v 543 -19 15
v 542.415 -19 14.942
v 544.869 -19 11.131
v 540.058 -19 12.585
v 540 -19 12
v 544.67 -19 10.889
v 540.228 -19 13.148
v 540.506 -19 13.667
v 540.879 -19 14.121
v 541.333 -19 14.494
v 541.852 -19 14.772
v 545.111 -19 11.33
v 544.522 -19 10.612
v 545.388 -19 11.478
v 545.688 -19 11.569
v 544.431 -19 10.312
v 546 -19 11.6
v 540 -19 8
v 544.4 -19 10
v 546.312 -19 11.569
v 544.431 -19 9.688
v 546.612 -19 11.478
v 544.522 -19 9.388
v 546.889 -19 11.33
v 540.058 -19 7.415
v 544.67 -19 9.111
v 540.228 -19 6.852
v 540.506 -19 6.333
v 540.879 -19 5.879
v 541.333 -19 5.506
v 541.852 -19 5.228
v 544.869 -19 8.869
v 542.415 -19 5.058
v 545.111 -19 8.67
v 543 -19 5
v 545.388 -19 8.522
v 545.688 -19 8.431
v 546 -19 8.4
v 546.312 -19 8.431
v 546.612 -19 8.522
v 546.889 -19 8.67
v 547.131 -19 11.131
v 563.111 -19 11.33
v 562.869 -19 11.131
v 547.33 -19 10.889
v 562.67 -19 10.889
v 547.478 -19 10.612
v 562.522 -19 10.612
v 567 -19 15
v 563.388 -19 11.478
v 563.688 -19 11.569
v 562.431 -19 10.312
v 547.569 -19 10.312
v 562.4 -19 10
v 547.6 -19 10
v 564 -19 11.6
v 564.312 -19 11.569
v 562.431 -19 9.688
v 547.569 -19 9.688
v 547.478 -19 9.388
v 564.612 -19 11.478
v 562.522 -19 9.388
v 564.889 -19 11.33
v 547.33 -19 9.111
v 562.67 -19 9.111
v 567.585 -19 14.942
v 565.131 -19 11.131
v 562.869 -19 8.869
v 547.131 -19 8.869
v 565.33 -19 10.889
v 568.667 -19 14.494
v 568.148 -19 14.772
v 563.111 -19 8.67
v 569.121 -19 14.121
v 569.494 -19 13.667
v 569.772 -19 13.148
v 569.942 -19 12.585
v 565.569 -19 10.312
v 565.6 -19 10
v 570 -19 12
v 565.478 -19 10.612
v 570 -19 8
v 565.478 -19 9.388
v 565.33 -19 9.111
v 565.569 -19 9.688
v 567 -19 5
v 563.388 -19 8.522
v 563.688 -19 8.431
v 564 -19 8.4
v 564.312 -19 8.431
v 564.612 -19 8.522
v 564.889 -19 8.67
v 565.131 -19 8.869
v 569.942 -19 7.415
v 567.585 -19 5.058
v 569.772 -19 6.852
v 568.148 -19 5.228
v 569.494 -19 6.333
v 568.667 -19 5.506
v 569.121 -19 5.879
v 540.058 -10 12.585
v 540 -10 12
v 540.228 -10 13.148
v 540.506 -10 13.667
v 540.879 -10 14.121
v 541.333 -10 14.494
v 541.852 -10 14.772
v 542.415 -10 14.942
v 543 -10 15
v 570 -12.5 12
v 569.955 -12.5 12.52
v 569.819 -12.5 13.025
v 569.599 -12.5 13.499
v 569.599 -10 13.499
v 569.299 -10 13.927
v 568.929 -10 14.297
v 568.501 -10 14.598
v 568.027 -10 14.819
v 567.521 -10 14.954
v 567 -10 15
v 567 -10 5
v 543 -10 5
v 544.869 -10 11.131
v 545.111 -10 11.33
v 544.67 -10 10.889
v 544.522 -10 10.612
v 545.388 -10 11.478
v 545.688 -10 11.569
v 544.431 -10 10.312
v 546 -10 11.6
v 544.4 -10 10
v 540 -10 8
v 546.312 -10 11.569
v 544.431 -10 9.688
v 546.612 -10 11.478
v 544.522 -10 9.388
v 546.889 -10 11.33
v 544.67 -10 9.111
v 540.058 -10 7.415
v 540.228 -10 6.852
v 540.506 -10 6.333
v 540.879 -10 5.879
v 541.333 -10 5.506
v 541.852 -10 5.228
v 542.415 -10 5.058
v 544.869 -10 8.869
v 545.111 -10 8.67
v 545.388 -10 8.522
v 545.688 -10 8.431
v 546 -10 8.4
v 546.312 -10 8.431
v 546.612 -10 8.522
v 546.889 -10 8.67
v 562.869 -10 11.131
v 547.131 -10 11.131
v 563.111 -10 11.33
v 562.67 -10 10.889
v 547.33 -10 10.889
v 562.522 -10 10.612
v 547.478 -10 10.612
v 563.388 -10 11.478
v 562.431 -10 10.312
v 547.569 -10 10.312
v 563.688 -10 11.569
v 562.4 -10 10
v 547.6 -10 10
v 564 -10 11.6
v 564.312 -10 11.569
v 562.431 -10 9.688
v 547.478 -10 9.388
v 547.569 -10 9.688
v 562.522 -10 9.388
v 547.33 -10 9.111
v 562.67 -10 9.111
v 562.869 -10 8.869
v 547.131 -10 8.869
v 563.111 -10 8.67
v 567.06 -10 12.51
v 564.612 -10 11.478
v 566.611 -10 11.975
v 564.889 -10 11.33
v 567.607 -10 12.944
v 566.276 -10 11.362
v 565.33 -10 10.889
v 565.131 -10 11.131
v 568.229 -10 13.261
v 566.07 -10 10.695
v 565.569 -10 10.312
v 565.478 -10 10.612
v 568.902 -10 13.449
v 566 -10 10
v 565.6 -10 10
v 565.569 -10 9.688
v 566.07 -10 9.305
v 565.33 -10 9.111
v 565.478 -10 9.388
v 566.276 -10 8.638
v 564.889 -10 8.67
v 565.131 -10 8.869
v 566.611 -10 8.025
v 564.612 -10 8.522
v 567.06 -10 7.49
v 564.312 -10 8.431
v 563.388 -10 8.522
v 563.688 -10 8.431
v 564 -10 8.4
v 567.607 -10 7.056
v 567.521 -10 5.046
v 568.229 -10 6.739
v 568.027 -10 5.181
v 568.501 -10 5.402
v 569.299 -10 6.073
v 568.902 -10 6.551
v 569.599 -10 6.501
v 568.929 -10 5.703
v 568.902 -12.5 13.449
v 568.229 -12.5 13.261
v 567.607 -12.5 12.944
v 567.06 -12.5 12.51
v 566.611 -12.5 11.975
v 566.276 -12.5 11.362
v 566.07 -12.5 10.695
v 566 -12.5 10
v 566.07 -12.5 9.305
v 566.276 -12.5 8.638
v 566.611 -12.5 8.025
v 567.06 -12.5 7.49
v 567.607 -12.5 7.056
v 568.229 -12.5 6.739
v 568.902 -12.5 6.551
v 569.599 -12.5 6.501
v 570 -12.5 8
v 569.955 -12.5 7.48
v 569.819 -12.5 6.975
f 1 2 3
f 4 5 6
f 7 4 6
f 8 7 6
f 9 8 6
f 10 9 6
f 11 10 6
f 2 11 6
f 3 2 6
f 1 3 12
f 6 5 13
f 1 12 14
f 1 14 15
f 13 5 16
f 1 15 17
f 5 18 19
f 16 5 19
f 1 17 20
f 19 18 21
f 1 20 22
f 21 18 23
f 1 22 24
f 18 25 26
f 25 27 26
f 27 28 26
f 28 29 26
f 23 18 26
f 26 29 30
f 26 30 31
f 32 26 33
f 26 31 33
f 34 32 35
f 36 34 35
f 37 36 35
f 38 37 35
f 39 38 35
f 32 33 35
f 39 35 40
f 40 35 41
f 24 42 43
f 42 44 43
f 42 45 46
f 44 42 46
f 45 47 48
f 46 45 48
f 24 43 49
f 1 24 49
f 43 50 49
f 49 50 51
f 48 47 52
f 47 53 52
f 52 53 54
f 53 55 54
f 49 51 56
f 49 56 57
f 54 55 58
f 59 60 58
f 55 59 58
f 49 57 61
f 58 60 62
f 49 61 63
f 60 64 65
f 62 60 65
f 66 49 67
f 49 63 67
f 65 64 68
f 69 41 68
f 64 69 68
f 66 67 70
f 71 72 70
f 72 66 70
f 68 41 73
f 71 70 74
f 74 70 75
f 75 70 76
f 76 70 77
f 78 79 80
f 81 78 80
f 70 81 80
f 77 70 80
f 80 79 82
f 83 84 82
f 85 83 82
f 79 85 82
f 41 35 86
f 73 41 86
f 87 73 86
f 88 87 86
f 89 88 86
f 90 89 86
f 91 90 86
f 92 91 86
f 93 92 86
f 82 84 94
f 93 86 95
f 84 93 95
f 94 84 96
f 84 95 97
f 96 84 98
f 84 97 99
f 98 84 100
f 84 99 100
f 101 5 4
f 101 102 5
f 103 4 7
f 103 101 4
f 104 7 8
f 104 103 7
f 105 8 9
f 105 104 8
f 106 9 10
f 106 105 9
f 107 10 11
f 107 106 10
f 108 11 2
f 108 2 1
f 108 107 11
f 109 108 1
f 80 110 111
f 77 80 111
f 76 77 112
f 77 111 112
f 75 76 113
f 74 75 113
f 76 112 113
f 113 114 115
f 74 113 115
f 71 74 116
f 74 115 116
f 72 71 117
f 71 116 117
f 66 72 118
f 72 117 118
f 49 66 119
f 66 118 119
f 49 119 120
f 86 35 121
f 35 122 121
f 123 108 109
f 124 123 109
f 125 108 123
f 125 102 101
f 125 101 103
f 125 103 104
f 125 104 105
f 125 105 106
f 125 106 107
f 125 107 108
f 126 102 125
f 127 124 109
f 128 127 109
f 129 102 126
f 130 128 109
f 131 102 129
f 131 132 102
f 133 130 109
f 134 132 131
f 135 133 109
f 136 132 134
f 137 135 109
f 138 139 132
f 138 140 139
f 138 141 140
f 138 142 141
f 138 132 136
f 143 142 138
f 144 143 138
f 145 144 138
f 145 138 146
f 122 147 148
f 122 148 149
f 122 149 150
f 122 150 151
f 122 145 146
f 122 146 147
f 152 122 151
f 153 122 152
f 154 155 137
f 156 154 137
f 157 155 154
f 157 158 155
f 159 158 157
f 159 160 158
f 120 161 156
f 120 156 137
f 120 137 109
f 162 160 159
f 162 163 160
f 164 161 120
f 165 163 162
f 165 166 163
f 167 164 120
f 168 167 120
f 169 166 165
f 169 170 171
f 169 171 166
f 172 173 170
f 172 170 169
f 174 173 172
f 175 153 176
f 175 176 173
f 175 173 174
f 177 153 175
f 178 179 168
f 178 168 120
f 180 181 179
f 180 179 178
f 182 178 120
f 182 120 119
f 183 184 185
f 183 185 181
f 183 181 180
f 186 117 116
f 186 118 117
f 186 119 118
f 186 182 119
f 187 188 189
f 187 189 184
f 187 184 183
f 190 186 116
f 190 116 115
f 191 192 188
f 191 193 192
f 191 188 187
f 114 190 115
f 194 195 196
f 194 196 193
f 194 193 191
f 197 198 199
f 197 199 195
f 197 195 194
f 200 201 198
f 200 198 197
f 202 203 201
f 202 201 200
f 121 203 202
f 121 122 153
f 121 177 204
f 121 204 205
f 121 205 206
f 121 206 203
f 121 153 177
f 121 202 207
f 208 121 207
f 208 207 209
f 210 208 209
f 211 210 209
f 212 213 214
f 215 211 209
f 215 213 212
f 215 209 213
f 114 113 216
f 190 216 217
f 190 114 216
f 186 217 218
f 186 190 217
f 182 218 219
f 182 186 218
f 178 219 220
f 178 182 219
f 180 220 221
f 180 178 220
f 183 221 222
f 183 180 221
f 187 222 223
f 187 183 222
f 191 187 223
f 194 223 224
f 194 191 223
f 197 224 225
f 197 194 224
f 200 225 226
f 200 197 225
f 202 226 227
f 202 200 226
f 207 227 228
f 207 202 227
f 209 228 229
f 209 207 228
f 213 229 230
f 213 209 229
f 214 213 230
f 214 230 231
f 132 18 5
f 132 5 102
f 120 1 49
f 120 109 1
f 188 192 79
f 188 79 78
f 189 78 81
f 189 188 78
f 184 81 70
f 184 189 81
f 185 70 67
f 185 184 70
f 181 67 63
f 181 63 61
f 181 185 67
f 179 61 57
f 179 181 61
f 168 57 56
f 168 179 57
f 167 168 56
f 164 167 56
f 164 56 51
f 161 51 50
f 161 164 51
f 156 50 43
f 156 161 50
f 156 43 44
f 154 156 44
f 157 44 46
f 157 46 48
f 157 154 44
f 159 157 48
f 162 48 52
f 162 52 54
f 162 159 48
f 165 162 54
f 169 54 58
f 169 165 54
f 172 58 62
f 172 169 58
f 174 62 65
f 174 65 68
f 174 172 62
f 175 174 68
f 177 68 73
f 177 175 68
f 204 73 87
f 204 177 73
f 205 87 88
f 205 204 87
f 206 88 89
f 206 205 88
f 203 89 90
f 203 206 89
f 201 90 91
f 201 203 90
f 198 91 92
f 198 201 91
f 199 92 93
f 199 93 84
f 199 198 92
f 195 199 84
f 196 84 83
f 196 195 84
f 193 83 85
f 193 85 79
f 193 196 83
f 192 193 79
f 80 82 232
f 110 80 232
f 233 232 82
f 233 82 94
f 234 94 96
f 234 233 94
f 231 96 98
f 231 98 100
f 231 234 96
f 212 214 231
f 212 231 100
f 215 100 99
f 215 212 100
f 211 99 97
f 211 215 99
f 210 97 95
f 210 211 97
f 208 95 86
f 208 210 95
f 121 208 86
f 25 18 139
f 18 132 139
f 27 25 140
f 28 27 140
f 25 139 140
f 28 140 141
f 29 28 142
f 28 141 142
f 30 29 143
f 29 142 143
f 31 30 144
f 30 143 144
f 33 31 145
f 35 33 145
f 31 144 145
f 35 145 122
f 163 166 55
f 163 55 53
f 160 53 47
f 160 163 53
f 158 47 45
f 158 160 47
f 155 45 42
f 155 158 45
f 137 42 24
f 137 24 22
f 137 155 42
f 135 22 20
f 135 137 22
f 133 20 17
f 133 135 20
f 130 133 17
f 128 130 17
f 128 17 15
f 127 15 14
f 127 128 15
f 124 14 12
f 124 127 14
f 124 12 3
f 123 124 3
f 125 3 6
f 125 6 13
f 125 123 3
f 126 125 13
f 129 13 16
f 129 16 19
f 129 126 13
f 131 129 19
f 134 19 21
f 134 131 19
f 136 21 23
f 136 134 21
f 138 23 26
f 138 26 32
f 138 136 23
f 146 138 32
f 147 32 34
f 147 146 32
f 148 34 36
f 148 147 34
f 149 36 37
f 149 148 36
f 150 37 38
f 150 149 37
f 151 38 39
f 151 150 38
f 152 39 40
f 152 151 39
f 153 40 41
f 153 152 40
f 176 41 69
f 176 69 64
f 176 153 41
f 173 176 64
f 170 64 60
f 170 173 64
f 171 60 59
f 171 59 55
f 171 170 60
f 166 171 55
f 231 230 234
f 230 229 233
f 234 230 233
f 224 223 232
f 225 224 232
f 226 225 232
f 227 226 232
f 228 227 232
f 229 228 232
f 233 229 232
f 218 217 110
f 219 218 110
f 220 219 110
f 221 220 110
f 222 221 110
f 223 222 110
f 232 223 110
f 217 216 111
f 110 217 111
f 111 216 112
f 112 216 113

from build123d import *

# Parameters (mm, degrees)
CYLINDER465_R     = 3.5
CYLINDER465_DEPTH = 2.5
CYLINDER152_R     = 1.6
CYLINDER152_DEPTH = 9
CYLINDER153_R     = 1.6
CYLINDER153_DEPTH = 9
CYLINDER154_R     = 1.6
CYLINDER154_DEPTH = 9
CYLINDER155_R     = 1.6
CYLINDER155_DEPTH = 9
BOX072_W          = 30
BOX072_H          = 9
BOX072_DEPTH      = 10
FILLET035_R       = 3


with BuildPart() as cylinder579:
    # Cylinder465 → Cylinder465 (new body)
    with BuildSketch(Plane(origin=(569.5, -10, 10), x_dir=(1, 0, 0), z_dir=(0, -1, 0))):
        Circle(CYLINDER465_R)
    extrude(amount=CYLINDER465_DEPTH)


with BuildPart() as cylinder152:
    # Cylinder152 → Cylinder152 (new body)
    with BuildSketch(Plane(origin=(555, -5, 10), x_dir=(1, 0, 0), z_dir=(0, -1, 0))):
        Circle(CYLINDER152_R)
    extrude(amount=CYLINDER152_DEPTH)


with BuildPart() as fusion138:
    # Cylinder153 → Cylinder153 (new body)
    with BuildSketch(Plane(origin=(450, -5, 10), x_dir=(1, 0, 0), z_dir=(0, -1, 0))):
        Circle(CYLINDER153_R)
    extrude(amount=CYLINDER153_DEPTH)

    # Fusion138: union Cylinder152
    add(cylinder152.part)


with BuildPart() as fusion138_1:
    # Fusion138 placement: moved
    add(fusion138.part.moved(Location((-9, 5, 0))))


with BuildPart() as cylinder154:
    # Cylinder154 → Cylinder154 (new body)
    with BuildSketch(Plane(origin=(555, -5, 10), x_dir=(1, 0, 0), z_dir=(0, -1, 0))):
        Circle(CYLINDER154_R)
    extrude(amount=CYLINDER154_DEPTH)


with BuildPart() as fusion137:
    # Cylinder155 → Cylinder155 (new body)
    with BuildSketch(Plane(origin=(450, -5, 10), x_dir=(1, 0, 0), z_dir=(0, -1, 0))):
        Circle(CYLINDER155_R)
    extrude(amount=CYLINDER155_DEPTH)

    # Fusion139: union Cylinder154
    add(cylinder154.part)


with BuildPart() as fusion137_1:
    # Fusion139 placement: moved
    add(fusion137.part.moved(Location((9, 5, 0))))

    # Fusion137: union Fusion138
    add(fusion138_1.part)


with BuildPart() as fender_spacer_rear_left:
    # Box072 → Box072 (new body)
    with BuildSketch(Plane(origin=(435, -9, 5), x_dir=(1, 0, 0), z_dir=(0, 0, 1))):
        with Locations((15, 4.5)):
            Rectangle(BOX072_W, BOX072_H)
    extrude(amount=BOX072_DEPTH)

    # Fillet035
    fillet035_edges = [fender_spacer_rear_left.edges().sort_by_distance(p)[0] for p in [
        (435, -4.5, 15),
        (435, -4.5, 5),
        (465, -4.5, 15),
        (465, -4.5, 5),
    ]]
    fillet(fillet035_edges, radius=FILLET035_R)


with BuildPart() as fender_spacer_rear_left_1:
    # Fillet035 placement: moved
    add(fender_spacer_rear_left.part.moved(Location((105, 0, 0))))

    # Cut082: cut Fusion137
    add(fusion137_1.part, mode=Mode.SUBTRACT)


with BuildPart() as fender_spacer_rear_left_2:
    # Cut082 placement: moved
    add(fender_spacer_rear_left_1.part.moved(Location((0, -10, 0))))

    # Cut321: cut Cylinder579
    add(cylinder579.part, mode=Mode.SUBTRACT)


solid = fender_spacer_rear_left_2.part
